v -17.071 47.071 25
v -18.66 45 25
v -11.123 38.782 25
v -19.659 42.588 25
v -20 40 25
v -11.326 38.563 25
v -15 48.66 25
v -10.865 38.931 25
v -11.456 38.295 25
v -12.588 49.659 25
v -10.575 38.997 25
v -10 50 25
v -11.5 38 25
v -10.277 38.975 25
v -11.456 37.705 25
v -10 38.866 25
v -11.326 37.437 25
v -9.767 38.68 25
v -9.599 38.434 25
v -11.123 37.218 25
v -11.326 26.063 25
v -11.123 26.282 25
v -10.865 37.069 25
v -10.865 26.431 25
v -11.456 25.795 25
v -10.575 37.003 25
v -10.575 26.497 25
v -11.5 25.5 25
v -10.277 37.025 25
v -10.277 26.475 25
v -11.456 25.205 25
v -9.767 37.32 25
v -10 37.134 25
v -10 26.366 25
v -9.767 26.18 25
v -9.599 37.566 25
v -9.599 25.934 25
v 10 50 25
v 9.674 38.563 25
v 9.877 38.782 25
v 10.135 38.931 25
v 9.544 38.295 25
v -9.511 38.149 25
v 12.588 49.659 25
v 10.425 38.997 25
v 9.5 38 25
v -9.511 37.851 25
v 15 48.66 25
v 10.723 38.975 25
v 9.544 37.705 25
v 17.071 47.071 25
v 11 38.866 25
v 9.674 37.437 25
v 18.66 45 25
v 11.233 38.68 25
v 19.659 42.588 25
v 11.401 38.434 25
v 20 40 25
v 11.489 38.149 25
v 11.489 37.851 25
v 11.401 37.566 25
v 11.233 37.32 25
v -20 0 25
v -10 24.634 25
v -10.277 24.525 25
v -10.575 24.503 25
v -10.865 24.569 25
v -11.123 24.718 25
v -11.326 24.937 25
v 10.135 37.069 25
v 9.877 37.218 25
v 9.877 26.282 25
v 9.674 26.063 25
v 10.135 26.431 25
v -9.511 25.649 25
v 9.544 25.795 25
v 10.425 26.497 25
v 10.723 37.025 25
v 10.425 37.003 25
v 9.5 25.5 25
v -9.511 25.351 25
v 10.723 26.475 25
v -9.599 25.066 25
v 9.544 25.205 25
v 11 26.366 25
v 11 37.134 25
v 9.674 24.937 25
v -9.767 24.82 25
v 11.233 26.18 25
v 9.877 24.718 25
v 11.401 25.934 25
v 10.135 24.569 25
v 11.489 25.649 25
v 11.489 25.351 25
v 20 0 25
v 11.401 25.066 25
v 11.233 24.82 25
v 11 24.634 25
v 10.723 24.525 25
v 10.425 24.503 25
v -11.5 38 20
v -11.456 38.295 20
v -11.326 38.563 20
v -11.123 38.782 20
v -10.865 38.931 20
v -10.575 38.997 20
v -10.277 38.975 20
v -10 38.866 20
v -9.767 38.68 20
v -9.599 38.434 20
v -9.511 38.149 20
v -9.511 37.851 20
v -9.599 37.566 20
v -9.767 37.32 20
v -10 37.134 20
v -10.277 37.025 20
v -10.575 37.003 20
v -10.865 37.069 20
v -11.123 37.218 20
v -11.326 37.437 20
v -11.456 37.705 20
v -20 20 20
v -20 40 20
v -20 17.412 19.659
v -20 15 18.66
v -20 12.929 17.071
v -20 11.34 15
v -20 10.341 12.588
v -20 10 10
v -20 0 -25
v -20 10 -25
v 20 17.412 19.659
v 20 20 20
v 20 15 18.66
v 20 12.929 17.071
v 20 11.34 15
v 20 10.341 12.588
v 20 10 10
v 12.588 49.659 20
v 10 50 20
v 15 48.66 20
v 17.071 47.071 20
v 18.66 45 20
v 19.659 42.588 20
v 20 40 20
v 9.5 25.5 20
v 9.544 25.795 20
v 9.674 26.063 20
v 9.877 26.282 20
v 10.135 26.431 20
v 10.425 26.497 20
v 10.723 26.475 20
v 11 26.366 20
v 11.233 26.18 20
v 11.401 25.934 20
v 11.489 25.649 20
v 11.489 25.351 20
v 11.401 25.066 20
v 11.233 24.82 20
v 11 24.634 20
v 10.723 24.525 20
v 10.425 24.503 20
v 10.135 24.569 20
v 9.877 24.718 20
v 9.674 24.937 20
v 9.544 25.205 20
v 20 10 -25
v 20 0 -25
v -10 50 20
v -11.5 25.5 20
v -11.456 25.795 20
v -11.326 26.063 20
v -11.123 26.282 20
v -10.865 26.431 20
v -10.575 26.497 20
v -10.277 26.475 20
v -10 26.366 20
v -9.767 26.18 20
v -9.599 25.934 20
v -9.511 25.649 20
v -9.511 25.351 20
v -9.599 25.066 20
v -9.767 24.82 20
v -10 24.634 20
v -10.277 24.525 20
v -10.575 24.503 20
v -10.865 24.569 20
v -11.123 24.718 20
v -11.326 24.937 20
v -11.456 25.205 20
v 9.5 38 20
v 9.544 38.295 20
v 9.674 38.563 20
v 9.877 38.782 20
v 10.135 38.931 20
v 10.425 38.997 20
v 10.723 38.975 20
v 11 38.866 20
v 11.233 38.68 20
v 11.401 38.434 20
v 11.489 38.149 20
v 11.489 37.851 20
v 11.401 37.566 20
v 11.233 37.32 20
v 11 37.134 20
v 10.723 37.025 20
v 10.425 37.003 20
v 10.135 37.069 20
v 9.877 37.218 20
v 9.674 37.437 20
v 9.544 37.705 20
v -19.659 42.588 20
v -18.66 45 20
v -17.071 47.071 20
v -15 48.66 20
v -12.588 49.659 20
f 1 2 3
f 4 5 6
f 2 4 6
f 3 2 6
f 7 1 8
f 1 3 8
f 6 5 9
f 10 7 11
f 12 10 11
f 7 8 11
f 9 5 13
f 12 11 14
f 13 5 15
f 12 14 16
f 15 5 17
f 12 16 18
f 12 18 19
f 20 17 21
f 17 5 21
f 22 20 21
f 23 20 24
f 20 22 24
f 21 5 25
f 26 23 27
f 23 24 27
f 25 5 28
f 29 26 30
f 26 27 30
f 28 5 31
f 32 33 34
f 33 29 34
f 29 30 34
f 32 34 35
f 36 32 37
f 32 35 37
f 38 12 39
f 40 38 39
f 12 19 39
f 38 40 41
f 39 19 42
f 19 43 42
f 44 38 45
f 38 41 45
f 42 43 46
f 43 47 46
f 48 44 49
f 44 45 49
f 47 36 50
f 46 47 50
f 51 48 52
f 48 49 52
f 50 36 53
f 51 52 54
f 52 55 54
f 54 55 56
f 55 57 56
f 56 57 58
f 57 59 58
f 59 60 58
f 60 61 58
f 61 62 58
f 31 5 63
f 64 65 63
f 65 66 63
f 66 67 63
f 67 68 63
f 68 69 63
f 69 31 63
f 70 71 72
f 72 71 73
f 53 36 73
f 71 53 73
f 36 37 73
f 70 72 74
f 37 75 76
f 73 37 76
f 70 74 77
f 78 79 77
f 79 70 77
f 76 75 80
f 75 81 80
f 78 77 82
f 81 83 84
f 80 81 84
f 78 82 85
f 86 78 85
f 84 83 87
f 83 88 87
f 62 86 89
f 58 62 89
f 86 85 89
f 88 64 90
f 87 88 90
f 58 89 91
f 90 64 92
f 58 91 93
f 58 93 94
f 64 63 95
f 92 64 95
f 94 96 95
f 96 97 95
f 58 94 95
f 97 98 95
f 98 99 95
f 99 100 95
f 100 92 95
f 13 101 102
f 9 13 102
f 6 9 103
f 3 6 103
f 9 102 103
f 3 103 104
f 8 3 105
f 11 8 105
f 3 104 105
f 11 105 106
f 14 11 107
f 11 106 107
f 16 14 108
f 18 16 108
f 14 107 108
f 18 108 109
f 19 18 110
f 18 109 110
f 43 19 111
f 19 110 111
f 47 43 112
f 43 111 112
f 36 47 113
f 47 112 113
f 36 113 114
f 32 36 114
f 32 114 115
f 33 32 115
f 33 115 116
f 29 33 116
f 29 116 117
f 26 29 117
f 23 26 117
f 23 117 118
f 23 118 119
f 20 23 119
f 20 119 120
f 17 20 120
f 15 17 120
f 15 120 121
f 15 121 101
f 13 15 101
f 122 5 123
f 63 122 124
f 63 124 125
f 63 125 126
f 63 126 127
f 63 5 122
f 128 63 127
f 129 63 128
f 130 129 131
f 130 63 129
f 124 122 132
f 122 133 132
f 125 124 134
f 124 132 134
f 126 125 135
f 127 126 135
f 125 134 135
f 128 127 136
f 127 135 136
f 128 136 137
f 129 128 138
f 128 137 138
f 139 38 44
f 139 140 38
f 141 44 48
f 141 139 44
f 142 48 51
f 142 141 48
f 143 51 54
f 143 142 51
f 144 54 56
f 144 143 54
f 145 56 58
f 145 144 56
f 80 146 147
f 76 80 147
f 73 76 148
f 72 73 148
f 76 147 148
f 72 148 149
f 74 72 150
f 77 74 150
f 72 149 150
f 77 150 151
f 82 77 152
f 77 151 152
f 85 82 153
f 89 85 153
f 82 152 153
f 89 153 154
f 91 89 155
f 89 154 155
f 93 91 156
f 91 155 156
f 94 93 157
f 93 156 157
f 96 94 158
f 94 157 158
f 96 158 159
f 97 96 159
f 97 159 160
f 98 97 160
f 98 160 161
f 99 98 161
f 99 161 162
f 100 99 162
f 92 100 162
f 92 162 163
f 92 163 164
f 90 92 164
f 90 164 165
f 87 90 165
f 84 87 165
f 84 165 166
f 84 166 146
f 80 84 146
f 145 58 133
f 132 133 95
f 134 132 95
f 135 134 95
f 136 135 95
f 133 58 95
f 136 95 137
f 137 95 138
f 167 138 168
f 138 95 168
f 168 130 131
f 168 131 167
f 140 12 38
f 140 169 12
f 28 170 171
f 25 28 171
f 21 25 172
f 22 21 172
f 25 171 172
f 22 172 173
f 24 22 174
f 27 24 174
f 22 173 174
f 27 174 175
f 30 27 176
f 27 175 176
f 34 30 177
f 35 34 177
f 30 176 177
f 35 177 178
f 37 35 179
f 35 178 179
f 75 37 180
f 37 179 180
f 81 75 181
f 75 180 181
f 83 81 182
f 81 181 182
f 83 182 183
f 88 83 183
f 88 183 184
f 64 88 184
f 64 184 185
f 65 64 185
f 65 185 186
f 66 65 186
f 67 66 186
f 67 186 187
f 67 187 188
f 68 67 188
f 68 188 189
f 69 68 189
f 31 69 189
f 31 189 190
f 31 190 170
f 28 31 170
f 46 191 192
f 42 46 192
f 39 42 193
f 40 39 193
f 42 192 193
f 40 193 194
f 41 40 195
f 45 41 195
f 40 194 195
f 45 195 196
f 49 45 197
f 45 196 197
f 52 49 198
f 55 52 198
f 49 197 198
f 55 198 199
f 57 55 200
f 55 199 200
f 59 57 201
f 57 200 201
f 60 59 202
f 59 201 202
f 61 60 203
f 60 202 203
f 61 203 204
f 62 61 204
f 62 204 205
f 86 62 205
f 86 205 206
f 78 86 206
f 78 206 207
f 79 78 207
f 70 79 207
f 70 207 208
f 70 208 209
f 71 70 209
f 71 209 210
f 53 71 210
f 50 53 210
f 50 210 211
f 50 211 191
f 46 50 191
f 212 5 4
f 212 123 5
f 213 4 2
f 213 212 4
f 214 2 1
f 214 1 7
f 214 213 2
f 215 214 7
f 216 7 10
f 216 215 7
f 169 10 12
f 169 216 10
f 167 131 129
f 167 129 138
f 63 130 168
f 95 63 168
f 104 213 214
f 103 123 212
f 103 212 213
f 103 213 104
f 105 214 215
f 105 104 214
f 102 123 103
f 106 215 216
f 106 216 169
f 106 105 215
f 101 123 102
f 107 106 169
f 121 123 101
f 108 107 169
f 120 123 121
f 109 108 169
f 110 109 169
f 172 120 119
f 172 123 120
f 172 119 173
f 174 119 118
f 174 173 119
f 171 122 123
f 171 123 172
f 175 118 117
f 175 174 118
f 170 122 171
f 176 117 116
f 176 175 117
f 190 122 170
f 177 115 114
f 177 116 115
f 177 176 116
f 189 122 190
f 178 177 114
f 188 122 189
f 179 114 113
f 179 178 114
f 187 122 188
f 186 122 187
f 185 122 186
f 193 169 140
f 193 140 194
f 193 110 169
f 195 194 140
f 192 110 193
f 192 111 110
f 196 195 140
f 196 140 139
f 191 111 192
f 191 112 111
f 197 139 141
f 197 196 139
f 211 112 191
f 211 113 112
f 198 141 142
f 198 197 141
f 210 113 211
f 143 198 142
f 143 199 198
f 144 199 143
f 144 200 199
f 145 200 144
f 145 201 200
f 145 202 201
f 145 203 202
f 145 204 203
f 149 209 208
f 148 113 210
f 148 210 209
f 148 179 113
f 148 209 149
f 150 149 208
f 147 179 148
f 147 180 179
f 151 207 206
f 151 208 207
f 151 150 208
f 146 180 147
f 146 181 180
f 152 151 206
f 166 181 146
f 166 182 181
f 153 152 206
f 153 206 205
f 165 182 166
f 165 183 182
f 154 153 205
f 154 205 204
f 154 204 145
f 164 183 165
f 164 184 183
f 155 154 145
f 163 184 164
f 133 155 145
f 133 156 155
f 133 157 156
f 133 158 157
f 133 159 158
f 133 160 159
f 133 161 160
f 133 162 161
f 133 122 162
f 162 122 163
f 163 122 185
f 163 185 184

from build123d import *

# Parameters (mm, degrees)
SKETCH1_W             = 40
SKETCH1_H             = 50
BOSS_EXTRUDE1_DEPTH   = 10
SKETCH2_W             = 40
SKETCH2_H             = 5
BOSS_EXTRUDE2_DEPTH   = 40
F_2_0MM_DOWEL_HOLE1_D = 2
FILLET1_R             = 10


with BuildPart() as part:
    # Sketch1 → Boss-Extrude1 (new body)
    with BuildSketch(Plane(origin=(0, 0, 0), x_dir=(1, 0, 0), z_dir=(0, 1, 0))):
        Rectangle(SKETCH1_W, SKETCH1_H)
    extrude(amount=BOSS_EXTRUDE1_DEPTH)

    # Sketch2 → Boss-Extrude2 (add)
    with BuildSketch(Plane(origin=(0, 10, 0), x_dir=(1, 0, 0), z_dir=(0, 1, 0))):
        with Locations((0, -22.5)):
            Rectangle(SKETCH2_W, SKETCH2_H)
    extrude(amount=BOSS_EXTRUDE2_DEPTH)

    # Ø2.0mm Dowel Hole1 (through all)
    with Locations(Plane.XY.offset(25)):
        with Locations((-10.5, 38), (10.5, 38), (-10.5, 25.5), (10.5, 25.5)):
            Hole(F_2_0MM_DOWEL_HOLE1_D / 2)

    # Fillet1
    fillet1_edges = [part.edges().sort_by_distance(p)[0] for p in [
        (0, 10, 20),
        (-20, 50, 22.5),
        (20, 50, 22.5),
    ]]
    fillet(fillet1_edges, radius=FILLET1_R)


solid = part.part
